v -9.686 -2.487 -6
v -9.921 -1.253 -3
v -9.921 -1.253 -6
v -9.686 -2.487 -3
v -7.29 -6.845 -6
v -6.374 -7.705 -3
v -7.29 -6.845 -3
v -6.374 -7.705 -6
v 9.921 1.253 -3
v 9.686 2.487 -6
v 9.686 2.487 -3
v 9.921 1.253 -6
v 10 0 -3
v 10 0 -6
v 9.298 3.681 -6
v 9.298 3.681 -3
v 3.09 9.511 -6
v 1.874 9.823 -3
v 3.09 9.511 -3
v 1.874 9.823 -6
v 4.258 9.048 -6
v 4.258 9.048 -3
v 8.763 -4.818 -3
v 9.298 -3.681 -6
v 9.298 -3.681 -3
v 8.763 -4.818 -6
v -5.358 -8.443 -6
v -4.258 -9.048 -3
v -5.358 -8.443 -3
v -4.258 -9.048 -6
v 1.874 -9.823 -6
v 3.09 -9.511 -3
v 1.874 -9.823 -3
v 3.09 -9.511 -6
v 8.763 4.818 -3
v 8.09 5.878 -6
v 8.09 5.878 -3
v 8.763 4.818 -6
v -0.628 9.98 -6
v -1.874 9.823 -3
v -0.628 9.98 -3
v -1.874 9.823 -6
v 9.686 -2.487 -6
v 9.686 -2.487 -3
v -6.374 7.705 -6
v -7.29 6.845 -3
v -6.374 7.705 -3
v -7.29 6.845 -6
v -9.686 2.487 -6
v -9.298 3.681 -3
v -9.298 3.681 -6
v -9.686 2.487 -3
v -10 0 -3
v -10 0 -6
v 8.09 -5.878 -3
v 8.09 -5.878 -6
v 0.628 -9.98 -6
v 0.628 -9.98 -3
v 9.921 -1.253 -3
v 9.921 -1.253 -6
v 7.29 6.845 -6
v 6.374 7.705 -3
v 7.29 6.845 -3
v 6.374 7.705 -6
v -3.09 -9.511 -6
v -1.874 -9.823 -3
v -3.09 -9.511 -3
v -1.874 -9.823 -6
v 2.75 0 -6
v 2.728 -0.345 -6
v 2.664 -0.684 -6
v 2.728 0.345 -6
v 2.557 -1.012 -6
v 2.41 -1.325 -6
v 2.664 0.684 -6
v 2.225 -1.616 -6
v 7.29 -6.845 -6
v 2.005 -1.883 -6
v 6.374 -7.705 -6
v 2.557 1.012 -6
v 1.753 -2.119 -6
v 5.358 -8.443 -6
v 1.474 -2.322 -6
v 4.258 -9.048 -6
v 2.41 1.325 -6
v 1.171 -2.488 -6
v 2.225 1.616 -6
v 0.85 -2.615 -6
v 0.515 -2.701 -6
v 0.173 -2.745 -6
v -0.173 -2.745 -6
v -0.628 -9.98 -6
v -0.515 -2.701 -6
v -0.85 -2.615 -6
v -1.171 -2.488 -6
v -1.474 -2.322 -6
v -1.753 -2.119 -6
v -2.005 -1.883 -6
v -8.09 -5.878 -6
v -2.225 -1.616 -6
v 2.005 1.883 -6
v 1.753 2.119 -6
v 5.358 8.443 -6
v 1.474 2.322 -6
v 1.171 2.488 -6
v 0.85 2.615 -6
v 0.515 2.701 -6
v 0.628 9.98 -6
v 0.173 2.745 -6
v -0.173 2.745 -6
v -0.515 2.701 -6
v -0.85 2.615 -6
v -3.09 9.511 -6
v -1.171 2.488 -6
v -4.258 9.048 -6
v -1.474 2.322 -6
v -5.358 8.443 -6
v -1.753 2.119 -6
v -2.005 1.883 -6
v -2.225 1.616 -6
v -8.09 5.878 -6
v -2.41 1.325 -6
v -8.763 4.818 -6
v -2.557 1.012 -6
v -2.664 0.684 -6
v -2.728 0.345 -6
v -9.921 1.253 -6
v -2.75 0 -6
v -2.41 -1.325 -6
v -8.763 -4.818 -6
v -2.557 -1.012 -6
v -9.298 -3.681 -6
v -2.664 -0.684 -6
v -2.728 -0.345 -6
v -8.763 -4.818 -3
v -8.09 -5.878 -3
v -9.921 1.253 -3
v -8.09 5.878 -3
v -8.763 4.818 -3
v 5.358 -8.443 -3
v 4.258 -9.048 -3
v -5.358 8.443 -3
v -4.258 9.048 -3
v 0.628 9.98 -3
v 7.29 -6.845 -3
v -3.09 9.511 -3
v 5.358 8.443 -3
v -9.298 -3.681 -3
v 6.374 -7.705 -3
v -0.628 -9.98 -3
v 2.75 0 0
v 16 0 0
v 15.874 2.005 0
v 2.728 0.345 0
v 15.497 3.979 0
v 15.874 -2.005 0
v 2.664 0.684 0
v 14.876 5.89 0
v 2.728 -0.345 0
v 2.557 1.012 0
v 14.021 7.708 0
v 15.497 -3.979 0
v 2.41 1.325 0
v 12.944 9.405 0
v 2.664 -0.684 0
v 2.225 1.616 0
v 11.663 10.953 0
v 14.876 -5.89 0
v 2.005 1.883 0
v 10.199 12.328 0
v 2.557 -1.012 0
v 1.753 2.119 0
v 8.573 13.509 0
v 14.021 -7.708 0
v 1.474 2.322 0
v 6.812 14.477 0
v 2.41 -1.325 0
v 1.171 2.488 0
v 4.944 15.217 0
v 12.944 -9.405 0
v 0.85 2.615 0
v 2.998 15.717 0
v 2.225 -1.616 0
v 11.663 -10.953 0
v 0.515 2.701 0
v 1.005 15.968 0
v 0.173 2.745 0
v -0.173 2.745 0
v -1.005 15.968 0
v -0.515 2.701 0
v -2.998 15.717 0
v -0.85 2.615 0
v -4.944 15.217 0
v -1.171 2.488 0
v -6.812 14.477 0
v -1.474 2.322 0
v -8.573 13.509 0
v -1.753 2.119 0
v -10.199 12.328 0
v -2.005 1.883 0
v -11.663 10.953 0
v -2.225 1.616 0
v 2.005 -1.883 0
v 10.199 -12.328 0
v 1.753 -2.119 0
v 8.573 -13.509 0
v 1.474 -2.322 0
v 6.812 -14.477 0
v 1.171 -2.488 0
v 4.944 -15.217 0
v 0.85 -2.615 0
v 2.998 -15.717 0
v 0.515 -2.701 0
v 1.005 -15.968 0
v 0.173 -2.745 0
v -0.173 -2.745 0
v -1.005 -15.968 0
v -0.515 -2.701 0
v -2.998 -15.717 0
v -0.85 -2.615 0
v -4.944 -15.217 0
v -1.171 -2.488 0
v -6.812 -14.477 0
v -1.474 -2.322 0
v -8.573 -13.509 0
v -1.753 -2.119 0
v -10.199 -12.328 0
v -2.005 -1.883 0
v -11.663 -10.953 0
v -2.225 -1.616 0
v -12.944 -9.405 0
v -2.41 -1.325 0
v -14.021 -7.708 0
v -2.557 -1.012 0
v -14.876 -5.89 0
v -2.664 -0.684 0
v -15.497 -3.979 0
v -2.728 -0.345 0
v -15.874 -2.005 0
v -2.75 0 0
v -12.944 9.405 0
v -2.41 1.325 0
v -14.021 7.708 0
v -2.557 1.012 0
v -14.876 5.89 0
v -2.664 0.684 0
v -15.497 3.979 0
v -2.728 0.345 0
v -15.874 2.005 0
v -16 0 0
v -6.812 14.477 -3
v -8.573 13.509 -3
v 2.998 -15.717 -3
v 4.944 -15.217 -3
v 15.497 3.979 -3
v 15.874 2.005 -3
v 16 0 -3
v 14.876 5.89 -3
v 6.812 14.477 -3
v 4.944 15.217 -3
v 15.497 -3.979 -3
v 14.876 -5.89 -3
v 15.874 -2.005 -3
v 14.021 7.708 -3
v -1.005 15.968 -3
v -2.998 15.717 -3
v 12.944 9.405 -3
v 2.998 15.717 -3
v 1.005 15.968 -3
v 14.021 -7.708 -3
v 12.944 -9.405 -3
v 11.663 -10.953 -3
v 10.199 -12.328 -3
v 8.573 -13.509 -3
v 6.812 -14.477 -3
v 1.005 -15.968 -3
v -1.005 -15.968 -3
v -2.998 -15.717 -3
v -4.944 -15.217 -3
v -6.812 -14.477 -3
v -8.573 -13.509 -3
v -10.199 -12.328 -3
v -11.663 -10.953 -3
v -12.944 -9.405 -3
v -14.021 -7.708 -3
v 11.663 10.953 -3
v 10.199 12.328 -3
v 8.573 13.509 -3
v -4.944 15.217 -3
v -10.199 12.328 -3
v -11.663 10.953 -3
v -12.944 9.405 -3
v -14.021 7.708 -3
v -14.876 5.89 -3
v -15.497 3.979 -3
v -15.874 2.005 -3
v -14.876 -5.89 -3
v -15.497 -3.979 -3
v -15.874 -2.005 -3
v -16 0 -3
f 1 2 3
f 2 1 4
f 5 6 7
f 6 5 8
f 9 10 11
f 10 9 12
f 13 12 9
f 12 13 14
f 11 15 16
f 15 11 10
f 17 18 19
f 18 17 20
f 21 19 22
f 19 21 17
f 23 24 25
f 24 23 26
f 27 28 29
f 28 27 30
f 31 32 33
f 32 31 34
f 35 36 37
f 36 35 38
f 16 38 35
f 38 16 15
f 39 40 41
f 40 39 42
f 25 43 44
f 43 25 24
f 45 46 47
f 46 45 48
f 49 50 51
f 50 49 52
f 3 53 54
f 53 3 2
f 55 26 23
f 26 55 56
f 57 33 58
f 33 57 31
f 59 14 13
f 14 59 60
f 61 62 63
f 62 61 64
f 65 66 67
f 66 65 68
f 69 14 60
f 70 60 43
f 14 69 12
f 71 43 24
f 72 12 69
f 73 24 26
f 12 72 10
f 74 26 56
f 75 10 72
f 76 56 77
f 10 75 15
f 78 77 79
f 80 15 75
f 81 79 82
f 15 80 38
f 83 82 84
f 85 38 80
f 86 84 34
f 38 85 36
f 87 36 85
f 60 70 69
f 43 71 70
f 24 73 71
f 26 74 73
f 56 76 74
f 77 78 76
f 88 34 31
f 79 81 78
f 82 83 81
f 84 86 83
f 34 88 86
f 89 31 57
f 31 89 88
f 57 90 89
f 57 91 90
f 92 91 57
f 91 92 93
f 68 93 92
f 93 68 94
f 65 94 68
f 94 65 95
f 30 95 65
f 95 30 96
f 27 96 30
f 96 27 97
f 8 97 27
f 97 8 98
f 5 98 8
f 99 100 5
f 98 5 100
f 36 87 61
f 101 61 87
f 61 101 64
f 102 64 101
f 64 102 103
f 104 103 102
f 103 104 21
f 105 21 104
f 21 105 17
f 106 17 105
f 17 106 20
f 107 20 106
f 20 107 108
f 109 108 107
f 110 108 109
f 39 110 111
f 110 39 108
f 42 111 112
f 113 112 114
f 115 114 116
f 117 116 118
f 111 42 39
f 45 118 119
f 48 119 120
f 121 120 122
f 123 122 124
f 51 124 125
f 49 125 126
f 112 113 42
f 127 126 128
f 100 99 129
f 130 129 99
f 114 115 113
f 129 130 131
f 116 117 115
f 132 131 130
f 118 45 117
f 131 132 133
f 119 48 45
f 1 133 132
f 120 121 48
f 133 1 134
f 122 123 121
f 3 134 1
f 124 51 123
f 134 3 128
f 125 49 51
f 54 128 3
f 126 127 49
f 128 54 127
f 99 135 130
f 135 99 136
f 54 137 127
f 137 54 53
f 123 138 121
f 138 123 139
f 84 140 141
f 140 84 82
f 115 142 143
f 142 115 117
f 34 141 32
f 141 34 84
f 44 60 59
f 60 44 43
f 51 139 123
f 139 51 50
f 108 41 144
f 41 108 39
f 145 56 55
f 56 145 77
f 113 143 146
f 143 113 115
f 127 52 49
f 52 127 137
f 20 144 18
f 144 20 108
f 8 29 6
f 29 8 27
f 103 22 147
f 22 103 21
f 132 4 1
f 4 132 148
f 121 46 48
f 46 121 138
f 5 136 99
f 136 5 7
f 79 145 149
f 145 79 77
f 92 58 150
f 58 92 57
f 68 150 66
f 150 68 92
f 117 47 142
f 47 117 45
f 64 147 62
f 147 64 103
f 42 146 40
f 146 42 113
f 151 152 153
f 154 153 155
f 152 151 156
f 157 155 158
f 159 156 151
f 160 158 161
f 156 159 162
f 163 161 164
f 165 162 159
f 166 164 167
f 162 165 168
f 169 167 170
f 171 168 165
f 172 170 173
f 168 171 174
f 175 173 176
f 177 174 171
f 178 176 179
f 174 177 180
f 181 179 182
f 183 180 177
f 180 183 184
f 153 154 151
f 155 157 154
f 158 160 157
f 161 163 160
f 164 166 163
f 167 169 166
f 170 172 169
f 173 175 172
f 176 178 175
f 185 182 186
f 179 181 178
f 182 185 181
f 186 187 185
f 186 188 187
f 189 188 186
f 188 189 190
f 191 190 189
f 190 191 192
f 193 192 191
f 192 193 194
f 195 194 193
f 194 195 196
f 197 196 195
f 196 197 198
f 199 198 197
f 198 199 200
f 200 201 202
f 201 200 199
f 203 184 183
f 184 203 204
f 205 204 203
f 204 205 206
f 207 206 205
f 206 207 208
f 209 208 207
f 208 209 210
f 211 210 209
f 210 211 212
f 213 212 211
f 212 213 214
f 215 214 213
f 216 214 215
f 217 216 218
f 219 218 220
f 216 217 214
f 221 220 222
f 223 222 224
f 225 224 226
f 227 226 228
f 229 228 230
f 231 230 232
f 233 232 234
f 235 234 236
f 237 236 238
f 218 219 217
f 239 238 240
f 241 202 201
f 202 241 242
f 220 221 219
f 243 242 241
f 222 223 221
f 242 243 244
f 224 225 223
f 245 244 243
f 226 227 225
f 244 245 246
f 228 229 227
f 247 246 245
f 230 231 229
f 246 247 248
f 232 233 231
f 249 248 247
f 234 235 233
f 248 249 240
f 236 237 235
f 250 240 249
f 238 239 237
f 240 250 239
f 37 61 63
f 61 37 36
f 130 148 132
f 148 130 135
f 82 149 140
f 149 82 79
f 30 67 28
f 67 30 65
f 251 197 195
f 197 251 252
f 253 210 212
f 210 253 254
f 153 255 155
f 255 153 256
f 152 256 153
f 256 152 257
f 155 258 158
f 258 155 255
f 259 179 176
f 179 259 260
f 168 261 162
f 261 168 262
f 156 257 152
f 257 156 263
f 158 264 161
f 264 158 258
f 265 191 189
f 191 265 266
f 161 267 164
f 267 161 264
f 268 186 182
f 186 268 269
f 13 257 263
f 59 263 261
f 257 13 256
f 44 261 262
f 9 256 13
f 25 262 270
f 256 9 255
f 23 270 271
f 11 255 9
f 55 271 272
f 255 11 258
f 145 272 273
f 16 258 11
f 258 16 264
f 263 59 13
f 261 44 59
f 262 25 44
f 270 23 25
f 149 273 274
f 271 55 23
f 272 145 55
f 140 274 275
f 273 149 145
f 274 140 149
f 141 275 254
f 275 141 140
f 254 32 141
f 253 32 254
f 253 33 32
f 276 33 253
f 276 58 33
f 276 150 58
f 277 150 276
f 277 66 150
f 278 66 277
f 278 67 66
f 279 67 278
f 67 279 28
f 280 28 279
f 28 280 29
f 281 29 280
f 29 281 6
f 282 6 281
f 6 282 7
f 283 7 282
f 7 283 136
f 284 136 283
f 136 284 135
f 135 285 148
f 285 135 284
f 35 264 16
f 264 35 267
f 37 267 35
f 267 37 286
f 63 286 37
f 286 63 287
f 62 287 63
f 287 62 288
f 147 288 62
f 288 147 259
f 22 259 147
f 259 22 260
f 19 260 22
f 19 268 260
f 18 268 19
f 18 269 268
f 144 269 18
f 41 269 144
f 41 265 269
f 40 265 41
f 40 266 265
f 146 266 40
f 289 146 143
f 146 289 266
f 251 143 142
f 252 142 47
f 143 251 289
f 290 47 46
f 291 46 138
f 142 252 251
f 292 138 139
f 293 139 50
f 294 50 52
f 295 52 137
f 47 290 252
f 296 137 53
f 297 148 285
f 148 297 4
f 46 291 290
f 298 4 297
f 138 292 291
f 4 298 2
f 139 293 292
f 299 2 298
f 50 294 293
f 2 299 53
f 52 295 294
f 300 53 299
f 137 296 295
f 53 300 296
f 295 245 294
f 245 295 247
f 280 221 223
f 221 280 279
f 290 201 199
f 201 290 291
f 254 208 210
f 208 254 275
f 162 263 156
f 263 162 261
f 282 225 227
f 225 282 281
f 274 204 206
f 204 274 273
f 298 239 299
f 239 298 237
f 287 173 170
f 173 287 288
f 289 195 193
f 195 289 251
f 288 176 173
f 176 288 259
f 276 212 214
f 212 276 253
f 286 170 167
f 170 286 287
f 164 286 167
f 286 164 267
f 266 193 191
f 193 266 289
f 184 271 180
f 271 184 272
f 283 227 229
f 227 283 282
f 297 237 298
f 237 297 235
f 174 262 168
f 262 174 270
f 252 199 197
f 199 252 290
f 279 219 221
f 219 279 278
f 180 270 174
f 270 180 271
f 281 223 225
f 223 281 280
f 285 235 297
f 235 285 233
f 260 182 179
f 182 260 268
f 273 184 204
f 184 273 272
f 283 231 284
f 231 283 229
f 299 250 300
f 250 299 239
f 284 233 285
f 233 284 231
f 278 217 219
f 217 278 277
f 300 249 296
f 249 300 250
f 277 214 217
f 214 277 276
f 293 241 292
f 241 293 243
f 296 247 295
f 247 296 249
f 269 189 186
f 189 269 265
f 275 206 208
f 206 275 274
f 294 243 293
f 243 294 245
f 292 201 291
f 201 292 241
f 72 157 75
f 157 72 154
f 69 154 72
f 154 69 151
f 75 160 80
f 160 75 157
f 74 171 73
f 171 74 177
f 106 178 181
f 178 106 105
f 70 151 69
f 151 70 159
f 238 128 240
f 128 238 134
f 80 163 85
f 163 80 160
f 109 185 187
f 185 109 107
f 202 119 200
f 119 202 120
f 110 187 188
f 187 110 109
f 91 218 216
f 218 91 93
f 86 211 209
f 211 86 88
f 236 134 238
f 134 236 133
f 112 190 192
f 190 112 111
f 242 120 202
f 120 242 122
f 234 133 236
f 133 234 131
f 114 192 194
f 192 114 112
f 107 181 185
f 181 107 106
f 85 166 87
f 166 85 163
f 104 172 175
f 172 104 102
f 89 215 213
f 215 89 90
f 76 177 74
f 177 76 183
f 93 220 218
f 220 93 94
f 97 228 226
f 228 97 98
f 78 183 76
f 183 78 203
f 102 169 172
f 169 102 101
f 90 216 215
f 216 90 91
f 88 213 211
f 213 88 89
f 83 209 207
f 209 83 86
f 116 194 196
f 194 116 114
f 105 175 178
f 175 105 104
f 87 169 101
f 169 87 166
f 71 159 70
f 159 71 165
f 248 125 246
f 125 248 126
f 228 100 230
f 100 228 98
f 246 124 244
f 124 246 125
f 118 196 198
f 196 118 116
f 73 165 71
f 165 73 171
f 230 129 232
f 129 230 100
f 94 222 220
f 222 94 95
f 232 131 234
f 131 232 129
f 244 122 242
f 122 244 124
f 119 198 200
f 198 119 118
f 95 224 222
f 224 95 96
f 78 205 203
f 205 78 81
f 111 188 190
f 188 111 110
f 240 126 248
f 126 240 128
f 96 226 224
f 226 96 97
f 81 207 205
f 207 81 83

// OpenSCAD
$fn = 50;


difference() {
	union() {
		translate(v = [0, 0, -6.0000000000]) {
			cylinder(h = 6, r = 10.0000000000);
		}
		translate(v = [0, 0, -3.0000000000]) {
			cylinder(h = 3, r = 16.0000000000);
		}
	}
	union() {
		#translate(v = [0, 0, -6]) {
			cylinder(h = 6, r = 2.7500000000);
		}
	}
}
